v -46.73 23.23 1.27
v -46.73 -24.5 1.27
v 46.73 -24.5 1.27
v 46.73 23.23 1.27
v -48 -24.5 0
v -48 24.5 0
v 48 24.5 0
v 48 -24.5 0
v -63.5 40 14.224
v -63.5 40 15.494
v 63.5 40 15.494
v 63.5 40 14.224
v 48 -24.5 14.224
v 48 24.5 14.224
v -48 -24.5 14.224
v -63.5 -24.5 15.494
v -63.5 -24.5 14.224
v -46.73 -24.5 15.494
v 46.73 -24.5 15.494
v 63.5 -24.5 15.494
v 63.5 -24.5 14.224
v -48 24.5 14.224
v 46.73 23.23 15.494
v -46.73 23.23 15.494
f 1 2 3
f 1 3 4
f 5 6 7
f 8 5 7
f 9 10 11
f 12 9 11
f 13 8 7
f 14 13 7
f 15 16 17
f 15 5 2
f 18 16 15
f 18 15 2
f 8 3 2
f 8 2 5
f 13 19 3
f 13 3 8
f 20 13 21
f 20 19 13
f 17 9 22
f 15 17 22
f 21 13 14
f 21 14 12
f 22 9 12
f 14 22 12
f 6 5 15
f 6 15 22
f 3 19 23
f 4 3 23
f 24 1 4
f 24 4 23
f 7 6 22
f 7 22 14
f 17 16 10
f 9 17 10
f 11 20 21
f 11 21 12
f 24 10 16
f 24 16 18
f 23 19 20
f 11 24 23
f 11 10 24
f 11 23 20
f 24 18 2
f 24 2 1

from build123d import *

# Parameters (mm, degrees)
SKETCH1_W           = 96
SKETCH1_H           = 49
BOSS_EXTRUDE1_DEPTH = 15.494
SKETCH2_W           = 127
SKETCH2_H           = 64.5
BOSS_EXTRUDE2_DEPTH = 1.27
SHELL1_START        = -46.73
SHELL1_OUTLINE_W    = 47.73
SHELL1_OUTLINE_H    = 14.224
SHELL1_DEPTH        = 93.46


# Read off the part's stored shape, not the designer's step: Shell1
with BuildPart() as part:
    # Sketch1 → Boss-Extrude1 (new body)
    with BuildSketch(Plane.XY):
        Rectangle(SKETCH1_W, SKETCH1_H)
    extrude(amount=BOSS_EXTRUDE1_DEPTH)

    # Sketch2 → Boss-Extrude2 (add)
    with BuildSketch(Plane.XY.offset(15.494)):
        with Locations((0, 7.75)):
            Rectangle(SKETCH2_W, SKETCH2_H)
    extrude(amount=-BOSS_EXTRUDE2_DEPTH)

    # Shell1 outline → Shell1 (cut)
    with BuildSketch(Plane.YZ.offset(SHELL1_START)):
        with Locations((-0.635, 8.382)):
            Rectangle(SHELL1_OUTLINE_W, SHELL1_OUTLINE_H)
    extrude(amount=SHELL1_DEPTH, mode=Mode.SUBTRACT)


solid = part.part
